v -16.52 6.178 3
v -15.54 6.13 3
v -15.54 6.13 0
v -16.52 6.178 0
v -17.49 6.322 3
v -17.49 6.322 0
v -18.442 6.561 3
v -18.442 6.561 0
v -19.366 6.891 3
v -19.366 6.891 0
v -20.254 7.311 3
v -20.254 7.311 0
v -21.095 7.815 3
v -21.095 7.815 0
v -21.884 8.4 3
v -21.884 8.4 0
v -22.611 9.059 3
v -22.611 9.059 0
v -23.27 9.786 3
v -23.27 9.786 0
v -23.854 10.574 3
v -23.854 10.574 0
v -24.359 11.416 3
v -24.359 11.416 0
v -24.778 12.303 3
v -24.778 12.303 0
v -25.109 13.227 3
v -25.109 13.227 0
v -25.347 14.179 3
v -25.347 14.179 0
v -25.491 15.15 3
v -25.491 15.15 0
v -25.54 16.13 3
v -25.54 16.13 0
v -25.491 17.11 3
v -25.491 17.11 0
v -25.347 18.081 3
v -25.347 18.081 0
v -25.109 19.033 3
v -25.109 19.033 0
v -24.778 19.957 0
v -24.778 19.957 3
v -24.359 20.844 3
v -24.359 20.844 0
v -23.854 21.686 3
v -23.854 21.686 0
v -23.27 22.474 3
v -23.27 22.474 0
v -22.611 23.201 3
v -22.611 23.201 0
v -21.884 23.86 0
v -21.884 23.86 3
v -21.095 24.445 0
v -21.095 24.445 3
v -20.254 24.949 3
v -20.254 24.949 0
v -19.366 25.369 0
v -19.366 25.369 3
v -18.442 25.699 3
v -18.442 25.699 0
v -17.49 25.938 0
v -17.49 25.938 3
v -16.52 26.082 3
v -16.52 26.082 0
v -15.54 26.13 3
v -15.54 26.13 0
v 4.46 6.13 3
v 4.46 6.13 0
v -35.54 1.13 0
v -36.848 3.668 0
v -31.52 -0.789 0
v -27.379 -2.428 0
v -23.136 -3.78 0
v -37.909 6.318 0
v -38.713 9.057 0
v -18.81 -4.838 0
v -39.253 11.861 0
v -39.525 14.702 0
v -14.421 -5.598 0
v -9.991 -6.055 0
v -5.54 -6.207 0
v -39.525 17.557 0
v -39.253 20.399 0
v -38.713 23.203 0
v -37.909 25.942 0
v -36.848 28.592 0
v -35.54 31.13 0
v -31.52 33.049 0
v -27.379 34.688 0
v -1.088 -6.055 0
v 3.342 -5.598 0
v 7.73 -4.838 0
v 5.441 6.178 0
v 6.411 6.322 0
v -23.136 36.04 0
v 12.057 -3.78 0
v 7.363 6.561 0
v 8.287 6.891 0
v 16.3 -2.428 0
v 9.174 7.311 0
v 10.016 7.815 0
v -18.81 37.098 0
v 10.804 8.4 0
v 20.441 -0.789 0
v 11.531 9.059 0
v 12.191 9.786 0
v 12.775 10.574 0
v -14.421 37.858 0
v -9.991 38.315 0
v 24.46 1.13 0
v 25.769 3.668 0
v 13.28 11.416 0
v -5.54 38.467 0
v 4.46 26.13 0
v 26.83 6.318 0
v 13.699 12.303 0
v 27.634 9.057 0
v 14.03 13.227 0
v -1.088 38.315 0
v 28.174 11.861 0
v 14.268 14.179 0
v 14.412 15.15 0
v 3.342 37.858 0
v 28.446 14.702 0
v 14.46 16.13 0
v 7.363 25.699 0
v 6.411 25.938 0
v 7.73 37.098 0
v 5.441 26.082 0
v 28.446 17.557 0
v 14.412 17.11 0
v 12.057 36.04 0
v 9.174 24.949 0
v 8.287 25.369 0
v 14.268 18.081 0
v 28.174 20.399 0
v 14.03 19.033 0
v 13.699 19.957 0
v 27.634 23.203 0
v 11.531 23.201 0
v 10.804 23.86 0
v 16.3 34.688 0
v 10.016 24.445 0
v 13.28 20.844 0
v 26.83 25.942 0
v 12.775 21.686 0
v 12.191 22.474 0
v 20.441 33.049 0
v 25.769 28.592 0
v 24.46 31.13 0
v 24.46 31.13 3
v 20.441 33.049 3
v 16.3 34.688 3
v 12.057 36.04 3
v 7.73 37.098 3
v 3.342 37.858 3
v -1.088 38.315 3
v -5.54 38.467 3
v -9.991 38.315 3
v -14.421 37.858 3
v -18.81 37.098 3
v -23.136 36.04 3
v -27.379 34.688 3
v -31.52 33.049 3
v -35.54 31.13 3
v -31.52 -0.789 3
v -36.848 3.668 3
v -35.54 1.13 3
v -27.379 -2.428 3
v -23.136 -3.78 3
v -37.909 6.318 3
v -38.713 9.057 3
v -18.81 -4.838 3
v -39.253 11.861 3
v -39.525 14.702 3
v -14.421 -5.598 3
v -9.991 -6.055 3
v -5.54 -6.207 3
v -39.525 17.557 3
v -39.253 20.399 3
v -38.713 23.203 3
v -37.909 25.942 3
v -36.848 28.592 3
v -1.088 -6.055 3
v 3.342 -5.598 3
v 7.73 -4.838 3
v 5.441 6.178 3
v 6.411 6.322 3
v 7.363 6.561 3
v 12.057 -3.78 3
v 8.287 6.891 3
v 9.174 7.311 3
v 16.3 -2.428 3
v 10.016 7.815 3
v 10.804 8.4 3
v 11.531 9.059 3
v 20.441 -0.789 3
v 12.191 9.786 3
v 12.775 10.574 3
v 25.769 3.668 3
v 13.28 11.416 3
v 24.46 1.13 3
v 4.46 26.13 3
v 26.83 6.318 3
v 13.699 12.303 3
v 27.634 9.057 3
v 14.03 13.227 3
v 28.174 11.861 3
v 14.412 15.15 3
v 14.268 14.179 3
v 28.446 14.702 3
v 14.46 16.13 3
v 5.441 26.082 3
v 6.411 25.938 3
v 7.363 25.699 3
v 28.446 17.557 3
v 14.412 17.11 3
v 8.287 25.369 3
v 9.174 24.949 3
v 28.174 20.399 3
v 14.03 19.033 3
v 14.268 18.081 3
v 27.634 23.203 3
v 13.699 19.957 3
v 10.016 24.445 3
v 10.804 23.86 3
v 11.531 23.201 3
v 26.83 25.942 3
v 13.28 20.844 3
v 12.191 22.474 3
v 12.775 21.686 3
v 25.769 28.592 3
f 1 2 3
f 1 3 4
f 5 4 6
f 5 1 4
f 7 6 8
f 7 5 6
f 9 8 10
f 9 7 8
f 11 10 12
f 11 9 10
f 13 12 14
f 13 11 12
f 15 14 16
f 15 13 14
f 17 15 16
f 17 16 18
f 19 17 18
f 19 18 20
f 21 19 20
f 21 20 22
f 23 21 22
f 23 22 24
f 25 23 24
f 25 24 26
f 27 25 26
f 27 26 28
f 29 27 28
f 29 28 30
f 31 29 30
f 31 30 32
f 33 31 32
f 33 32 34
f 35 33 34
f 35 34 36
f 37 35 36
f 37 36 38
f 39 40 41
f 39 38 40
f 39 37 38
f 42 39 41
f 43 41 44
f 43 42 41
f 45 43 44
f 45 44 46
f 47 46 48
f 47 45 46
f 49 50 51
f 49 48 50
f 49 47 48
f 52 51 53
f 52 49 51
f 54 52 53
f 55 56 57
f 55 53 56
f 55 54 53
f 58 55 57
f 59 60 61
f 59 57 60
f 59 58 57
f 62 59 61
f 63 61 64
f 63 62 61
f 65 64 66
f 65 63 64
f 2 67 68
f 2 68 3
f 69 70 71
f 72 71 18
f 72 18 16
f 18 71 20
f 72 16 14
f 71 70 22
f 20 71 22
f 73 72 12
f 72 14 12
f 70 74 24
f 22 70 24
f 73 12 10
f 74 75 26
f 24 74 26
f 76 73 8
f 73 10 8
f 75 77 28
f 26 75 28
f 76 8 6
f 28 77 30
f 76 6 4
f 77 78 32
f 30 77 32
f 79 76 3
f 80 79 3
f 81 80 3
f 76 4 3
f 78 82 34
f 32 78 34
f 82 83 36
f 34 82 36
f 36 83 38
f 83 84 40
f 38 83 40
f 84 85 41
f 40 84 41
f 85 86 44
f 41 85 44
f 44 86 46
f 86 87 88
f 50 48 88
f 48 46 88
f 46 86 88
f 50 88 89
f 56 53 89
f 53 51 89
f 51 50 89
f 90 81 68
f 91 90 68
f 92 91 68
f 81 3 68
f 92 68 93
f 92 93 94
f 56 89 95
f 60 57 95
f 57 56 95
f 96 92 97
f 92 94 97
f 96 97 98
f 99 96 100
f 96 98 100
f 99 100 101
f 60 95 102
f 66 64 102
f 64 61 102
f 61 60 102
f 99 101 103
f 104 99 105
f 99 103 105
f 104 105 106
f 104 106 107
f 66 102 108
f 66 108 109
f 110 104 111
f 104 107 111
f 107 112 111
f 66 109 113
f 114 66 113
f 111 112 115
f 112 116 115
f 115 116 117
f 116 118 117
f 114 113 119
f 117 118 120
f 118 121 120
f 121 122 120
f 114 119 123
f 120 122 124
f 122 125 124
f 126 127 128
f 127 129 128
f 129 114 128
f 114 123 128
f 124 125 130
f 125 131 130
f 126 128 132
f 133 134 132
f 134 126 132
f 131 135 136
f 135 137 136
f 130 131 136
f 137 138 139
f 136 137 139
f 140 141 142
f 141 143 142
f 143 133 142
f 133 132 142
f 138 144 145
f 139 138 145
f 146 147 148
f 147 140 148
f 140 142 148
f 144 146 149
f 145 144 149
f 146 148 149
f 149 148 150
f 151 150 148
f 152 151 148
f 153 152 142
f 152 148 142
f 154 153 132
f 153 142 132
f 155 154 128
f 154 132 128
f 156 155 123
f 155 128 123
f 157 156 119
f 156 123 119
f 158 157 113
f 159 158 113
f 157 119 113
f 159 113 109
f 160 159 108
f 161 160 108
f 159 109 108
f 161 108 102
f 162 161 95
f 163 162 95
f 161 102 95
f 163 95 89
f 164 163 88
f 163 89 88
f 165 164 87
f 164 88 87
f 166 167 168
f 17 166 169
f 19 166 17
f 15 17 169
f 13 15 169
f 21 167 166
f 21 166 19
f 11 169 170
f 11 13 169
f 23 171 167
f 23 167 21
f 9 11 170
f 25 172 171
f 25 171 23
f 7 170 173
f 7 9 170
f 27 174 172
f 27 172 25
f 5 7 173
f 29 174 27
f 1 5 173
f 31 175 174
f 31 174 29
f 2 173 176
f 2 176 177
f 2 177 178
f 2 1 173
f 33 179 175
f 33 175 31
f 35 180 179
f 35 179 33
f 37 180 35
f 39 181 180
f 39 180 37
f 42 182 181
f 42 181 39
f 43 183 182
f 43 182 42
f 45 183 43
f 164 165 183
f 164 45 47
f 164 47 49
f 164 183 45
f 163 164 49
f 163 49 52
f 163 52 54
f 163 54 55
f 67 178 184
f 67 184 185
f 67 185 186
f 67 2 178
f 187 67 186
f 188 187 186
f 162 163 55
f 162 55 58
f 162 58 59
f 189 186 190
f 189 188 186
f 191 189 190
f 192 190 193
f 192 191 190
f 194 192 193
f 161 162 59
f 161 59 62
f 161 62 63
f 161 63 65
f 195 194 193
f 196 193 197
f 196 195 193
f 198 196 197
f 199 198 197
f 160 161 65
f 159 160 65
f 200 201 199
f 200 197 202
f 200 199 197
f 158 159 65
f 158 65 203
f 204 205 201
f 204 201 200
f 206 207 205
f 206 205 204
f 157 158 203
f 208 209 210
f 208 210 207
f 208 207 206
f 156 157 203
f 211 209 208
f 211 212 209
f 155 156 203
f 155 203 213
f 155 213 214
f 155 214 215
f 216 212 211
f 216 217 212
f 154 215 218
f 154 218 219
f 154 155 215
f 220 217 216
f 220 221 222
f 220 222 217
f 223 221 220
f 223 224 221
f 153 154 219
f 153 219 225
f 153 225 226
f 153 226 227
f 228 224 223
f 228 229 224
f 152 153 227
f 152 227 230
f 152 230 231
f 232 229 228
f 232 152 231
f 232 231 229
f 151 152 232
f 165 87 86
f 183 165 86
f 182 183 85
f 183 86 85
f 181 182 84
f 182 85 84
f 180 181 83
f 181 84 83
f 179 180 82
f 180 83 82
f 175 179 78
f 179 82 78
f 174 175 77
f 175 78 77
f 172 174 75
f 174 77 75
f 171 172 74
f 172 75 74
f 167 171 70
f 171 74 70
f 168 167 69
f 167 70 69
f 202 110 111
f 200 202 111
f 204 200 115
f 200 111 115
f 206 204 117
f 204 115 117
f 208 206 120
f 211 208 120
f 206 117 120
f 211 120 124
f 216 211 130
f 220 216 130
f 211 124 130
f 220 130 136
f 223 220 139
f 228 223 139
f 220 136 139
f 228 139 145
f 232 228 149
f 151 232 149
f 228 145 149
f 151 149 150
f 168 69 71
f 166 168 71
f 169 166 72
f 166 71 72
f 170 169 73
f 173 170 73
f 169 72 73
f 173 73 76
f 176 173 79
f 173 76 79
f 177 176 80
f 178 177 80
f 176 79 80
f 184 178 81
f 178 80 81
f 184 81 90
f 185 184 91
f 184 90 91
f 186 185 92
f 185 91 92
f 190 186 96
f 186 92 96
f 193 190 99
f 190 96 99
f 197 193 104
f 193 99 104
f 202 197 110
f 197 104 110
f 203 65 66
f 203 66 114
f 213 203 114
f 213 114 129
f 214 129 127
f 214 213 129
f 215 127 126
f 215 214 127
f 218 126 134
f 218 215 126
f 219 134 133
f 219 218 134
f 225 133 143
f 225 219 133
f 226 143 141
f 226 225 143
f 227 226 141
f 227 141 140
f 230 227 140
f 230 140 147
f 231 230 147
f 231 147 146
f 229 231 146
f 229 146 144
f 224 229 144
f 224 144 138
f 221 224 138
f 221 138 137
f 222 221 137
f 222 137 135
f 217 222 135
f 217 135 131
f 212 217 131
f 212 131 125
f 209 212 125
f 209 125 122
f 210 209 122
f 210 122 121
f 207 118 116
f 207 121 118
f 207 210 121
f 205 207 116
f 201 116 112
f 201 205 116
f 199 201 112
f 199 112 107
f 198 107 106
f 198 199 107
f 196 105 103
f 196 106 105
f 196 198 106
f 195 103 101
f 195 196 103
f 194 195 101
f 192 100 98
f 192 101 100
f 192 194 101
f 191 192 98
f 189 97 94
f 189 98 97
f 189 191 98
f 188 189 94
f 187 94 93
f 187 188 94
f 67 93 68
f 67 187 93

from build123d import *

# Parameters (mm, degrees)
EXTRUDE_1_DEPTH     = 3
CUT_EXTRUDE_1_DEPTH = 56.259583795


with BuildPart() as part:
    # 草图1 → 凸台-拉伸1 (new body)
    with BuildSketch(Plane.XY):
        with BuildLine():
            ThreePointArc((-35.539590168, 31.129951211), (-39.558828054, 16.129951211), (-35.539590168, 1.129951211))
            ThreePointArc((-35.539590168, 1.129951211), (-5.539590168, -6.207235816), (24.460409832, 1.129951211))
            ThreePointArc((24.460409832, 1.129951211), (28.479647718, 16.129951211), (24.460409832, 31.129951211))
            ThreePointArc((24.460409832, 31.129951211), (-5.539590168, 38.467138237), (-35.539590168, 31.129951211))
        make_face()
    extrude(amount=EXTRUDE_1_DEPTH)

    # 草图2 → 切除-拉伸1 (cut, through all)
    with BuildSketch(Plane.XY.offset(3)):
        with BuildLine():
            Line((-15.539590168, 26.129951211), (4.460409832, 26.129951211))
            ThreePointArc((4.460409832, 26.129951211), (14.460409832, 16.129951211), (4.460409832, 6.129951211))
            Line((4.460409832, 6.129951211), (-15.539590168, 6.129951211))
            ThreePointArc((-15.539590168, 6.129951211), (-25.539590168, 16.129951211), (-15.539590168, 26.129951211))
        make_face()
    extrude(amount=-CUT_EXTRUDE_1_DEPTH, mode=Mode.SUBTRACT)


solid = part.part
